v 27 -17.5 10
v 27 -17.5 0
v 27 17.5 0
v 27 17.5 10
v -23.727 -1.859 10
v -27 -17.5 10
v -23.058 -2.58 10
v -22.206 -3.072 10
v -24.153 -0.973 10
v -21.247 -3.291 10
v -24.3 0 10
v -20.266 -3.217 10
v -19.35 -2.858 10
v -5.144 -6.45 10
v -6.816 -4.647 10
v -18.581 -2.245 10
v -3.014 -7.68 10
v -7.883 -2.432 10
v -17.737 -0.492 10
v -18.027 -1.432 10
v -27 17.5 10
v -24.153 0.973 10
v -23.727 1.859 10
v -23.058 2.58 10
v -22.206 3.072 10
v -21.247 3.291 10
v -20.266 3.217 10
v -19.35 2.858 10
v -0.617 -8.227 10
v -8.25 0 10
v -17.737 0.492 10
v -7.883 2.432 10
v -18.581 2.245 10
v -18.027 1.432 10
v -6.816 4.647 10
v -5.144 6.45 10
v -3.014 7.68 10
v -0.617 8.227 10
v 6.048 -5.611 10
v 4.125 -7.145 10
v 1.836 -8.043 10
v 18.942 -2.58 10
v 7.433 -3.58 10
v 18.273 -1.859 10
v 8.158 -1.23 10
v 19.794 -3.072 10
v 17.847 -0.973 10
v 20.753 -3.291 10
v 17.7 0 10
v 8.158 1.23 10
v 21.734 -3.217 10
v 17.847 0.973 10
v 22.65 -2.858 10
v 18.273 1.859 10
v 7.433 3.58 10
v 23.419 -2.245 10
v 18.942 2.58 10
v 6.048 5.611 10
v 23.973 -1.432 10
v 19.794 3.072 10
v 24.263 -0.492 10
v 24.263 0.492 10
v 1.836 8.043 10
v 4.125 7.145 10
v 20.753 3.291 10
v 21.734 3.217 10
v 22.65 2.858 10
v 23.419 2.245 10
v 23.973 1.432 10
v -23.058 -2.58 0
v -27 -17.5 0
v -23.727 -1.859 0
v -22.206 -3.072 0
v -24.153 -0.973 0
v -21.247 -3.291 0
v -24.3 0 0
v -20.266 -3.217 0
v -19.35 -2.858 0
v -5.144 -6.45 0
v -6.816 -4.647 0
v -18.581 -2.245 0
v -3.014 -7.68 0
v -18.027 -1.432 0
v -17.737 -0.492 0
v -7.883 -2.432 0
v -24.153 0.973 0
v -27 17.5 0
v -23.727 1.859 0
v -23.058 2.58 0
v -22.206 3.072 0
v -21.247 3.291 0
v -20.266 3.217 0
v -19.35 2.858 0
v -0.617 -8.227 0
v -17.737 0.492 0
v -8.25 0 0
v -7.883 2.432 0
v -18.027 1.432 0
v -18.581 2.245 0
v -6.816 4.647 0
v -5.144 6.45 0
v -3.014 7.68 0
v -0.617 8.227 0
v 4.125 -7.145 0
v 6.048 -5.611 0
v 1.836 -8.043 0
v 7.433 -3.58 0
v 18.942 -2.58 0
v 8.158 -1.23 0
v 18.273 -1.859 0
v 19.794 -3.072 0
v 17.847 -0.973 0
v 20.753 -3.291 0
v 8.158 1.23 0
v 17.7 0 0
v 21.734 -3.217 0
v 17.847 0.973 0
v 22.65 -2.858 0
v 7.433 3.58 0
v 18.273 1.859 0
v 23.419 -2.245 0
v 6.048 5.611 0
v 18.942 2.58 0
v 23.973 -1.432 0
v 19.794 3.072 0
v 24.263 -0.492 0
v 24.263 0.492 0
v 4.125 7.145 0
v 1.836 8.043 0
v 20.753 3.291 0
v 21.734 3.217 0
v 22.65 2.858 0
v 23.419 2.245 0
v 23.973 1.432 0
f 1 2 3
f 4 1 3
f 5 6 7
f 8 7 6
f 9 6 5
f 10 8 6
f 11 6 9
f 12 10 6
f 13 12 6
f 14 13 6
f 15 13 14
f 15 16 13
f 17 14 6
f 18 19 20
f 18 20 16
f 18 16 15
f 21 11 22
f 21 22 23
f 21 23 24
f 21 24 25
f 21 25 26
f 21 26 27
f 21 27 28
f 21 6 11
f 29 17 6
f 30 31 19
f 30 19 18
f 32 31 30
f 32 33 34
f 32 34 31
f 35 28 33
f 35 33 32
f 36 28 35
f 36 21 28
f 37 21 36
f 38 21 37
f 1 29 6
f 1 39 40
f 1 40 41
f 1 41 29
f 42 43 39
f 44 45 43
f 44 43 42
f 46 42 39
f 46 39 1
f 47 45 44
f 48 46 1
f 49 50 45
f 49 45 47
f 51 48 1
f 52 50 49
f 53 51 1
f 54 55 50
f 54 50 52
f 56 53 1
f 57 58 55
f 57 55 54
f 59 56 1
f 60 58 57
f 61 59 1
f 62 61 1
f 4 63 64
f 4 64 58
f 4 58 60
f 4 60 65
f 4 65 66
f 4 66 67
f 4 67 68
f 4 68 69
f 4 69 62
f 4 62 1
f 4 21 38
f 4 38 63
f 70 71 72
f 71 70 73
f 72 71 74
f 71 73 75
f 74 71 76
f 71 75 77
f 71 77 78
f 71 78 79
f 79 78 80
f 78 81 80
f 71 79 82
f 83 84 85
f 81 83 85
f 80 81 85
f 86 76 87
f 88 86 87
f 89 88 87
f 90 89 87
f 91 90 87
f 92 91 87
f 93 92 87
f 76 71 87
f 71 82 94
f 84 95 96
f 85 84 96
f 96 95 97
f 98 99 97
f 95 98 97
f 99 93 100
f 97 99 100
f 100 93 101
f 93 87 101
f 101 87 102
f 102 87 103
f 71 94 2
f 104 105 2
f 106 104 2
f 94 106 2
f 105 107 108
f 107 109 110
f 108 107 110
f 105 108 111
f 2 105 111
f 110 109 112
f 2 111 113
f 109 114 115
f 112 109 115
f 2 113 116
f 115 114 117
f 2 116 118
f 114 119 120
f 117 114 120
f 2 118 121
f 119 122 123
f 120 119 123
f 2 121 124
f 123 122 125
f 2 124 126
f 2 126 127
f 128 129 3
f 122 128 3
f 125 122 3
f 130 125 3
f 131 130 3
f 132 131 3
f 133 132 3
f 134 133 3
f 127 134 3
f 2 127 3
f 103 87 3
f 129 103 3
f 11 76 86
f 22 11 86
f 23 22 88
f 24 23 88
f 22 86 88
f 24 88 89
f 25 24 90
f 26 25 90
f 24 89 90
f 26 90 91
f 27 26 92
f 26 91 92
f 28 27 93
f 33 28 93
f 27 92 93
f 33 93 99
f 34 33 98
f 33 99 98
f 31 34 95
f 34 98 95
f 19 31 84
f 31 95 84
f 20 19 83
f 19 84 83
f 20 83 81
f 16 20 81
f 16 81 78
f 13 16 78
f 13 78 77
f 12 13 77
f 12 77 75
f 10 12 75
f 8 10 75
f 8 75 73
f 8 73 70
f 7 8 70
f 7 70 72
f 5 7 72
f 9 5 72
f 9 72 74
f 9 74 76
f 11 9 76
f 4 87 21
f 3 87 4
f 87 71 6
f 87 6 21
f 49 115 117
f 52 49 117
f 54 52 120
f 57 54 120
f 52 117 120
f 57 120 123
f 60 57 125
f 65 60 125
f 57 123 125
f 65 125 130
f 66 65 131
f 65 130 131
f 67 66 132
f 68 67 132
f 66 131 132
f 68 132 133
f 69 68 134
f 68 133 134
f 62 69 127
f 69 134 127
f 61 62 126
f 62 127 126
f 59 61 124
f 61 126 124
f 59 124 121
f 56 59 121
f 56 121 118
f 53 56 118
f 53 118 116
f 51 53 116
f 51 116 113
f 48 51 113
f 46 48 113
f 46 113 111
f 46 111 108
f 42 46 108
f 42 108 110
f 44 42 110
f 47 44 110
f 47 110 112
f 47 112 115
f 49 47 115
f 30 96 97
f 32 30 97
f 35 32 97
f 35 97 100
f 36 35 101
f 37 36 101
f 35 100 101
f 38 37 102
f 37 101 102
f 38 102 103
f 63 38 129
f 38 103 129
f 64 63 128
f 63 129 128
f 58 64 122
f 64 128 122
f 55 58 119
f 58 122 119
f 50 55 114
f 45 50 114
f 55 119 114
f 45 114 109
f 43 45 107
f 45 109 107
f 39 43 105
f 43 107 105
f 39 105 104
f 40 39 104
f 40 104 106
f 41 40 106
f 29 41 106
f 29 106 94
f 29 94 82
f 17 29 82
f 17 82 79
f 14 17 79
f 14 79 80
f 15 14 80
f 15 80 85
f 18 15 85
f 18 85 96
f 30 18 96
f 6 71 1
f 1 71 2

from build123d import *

# Parameters (mm, degrees)
F0_W     = 54
F0_H     = 35
F1_DEPTH = 10
F3_D     = 16.5
F5_D     = 6.6


with BuildPart() as f1:
    # F0 (on Top) → F1 (new body)
    with BuildSketch(Plane.XY):
        Rectangle(F0_W, F0_H)
    extrude(amount=F1_DEPTH)

    # F3 (through all)
    with Locations(Plane.XY.offset(10)):
        with Locations((0, 0)):
            Hole(F3_D / 2)

    # F5 (through all)
    with Locations(Plane.XY.offset(10)):
        with Locations((-21, 0), (21, 0)):
            Hole(F5_D / 2)


solid = f1.part
